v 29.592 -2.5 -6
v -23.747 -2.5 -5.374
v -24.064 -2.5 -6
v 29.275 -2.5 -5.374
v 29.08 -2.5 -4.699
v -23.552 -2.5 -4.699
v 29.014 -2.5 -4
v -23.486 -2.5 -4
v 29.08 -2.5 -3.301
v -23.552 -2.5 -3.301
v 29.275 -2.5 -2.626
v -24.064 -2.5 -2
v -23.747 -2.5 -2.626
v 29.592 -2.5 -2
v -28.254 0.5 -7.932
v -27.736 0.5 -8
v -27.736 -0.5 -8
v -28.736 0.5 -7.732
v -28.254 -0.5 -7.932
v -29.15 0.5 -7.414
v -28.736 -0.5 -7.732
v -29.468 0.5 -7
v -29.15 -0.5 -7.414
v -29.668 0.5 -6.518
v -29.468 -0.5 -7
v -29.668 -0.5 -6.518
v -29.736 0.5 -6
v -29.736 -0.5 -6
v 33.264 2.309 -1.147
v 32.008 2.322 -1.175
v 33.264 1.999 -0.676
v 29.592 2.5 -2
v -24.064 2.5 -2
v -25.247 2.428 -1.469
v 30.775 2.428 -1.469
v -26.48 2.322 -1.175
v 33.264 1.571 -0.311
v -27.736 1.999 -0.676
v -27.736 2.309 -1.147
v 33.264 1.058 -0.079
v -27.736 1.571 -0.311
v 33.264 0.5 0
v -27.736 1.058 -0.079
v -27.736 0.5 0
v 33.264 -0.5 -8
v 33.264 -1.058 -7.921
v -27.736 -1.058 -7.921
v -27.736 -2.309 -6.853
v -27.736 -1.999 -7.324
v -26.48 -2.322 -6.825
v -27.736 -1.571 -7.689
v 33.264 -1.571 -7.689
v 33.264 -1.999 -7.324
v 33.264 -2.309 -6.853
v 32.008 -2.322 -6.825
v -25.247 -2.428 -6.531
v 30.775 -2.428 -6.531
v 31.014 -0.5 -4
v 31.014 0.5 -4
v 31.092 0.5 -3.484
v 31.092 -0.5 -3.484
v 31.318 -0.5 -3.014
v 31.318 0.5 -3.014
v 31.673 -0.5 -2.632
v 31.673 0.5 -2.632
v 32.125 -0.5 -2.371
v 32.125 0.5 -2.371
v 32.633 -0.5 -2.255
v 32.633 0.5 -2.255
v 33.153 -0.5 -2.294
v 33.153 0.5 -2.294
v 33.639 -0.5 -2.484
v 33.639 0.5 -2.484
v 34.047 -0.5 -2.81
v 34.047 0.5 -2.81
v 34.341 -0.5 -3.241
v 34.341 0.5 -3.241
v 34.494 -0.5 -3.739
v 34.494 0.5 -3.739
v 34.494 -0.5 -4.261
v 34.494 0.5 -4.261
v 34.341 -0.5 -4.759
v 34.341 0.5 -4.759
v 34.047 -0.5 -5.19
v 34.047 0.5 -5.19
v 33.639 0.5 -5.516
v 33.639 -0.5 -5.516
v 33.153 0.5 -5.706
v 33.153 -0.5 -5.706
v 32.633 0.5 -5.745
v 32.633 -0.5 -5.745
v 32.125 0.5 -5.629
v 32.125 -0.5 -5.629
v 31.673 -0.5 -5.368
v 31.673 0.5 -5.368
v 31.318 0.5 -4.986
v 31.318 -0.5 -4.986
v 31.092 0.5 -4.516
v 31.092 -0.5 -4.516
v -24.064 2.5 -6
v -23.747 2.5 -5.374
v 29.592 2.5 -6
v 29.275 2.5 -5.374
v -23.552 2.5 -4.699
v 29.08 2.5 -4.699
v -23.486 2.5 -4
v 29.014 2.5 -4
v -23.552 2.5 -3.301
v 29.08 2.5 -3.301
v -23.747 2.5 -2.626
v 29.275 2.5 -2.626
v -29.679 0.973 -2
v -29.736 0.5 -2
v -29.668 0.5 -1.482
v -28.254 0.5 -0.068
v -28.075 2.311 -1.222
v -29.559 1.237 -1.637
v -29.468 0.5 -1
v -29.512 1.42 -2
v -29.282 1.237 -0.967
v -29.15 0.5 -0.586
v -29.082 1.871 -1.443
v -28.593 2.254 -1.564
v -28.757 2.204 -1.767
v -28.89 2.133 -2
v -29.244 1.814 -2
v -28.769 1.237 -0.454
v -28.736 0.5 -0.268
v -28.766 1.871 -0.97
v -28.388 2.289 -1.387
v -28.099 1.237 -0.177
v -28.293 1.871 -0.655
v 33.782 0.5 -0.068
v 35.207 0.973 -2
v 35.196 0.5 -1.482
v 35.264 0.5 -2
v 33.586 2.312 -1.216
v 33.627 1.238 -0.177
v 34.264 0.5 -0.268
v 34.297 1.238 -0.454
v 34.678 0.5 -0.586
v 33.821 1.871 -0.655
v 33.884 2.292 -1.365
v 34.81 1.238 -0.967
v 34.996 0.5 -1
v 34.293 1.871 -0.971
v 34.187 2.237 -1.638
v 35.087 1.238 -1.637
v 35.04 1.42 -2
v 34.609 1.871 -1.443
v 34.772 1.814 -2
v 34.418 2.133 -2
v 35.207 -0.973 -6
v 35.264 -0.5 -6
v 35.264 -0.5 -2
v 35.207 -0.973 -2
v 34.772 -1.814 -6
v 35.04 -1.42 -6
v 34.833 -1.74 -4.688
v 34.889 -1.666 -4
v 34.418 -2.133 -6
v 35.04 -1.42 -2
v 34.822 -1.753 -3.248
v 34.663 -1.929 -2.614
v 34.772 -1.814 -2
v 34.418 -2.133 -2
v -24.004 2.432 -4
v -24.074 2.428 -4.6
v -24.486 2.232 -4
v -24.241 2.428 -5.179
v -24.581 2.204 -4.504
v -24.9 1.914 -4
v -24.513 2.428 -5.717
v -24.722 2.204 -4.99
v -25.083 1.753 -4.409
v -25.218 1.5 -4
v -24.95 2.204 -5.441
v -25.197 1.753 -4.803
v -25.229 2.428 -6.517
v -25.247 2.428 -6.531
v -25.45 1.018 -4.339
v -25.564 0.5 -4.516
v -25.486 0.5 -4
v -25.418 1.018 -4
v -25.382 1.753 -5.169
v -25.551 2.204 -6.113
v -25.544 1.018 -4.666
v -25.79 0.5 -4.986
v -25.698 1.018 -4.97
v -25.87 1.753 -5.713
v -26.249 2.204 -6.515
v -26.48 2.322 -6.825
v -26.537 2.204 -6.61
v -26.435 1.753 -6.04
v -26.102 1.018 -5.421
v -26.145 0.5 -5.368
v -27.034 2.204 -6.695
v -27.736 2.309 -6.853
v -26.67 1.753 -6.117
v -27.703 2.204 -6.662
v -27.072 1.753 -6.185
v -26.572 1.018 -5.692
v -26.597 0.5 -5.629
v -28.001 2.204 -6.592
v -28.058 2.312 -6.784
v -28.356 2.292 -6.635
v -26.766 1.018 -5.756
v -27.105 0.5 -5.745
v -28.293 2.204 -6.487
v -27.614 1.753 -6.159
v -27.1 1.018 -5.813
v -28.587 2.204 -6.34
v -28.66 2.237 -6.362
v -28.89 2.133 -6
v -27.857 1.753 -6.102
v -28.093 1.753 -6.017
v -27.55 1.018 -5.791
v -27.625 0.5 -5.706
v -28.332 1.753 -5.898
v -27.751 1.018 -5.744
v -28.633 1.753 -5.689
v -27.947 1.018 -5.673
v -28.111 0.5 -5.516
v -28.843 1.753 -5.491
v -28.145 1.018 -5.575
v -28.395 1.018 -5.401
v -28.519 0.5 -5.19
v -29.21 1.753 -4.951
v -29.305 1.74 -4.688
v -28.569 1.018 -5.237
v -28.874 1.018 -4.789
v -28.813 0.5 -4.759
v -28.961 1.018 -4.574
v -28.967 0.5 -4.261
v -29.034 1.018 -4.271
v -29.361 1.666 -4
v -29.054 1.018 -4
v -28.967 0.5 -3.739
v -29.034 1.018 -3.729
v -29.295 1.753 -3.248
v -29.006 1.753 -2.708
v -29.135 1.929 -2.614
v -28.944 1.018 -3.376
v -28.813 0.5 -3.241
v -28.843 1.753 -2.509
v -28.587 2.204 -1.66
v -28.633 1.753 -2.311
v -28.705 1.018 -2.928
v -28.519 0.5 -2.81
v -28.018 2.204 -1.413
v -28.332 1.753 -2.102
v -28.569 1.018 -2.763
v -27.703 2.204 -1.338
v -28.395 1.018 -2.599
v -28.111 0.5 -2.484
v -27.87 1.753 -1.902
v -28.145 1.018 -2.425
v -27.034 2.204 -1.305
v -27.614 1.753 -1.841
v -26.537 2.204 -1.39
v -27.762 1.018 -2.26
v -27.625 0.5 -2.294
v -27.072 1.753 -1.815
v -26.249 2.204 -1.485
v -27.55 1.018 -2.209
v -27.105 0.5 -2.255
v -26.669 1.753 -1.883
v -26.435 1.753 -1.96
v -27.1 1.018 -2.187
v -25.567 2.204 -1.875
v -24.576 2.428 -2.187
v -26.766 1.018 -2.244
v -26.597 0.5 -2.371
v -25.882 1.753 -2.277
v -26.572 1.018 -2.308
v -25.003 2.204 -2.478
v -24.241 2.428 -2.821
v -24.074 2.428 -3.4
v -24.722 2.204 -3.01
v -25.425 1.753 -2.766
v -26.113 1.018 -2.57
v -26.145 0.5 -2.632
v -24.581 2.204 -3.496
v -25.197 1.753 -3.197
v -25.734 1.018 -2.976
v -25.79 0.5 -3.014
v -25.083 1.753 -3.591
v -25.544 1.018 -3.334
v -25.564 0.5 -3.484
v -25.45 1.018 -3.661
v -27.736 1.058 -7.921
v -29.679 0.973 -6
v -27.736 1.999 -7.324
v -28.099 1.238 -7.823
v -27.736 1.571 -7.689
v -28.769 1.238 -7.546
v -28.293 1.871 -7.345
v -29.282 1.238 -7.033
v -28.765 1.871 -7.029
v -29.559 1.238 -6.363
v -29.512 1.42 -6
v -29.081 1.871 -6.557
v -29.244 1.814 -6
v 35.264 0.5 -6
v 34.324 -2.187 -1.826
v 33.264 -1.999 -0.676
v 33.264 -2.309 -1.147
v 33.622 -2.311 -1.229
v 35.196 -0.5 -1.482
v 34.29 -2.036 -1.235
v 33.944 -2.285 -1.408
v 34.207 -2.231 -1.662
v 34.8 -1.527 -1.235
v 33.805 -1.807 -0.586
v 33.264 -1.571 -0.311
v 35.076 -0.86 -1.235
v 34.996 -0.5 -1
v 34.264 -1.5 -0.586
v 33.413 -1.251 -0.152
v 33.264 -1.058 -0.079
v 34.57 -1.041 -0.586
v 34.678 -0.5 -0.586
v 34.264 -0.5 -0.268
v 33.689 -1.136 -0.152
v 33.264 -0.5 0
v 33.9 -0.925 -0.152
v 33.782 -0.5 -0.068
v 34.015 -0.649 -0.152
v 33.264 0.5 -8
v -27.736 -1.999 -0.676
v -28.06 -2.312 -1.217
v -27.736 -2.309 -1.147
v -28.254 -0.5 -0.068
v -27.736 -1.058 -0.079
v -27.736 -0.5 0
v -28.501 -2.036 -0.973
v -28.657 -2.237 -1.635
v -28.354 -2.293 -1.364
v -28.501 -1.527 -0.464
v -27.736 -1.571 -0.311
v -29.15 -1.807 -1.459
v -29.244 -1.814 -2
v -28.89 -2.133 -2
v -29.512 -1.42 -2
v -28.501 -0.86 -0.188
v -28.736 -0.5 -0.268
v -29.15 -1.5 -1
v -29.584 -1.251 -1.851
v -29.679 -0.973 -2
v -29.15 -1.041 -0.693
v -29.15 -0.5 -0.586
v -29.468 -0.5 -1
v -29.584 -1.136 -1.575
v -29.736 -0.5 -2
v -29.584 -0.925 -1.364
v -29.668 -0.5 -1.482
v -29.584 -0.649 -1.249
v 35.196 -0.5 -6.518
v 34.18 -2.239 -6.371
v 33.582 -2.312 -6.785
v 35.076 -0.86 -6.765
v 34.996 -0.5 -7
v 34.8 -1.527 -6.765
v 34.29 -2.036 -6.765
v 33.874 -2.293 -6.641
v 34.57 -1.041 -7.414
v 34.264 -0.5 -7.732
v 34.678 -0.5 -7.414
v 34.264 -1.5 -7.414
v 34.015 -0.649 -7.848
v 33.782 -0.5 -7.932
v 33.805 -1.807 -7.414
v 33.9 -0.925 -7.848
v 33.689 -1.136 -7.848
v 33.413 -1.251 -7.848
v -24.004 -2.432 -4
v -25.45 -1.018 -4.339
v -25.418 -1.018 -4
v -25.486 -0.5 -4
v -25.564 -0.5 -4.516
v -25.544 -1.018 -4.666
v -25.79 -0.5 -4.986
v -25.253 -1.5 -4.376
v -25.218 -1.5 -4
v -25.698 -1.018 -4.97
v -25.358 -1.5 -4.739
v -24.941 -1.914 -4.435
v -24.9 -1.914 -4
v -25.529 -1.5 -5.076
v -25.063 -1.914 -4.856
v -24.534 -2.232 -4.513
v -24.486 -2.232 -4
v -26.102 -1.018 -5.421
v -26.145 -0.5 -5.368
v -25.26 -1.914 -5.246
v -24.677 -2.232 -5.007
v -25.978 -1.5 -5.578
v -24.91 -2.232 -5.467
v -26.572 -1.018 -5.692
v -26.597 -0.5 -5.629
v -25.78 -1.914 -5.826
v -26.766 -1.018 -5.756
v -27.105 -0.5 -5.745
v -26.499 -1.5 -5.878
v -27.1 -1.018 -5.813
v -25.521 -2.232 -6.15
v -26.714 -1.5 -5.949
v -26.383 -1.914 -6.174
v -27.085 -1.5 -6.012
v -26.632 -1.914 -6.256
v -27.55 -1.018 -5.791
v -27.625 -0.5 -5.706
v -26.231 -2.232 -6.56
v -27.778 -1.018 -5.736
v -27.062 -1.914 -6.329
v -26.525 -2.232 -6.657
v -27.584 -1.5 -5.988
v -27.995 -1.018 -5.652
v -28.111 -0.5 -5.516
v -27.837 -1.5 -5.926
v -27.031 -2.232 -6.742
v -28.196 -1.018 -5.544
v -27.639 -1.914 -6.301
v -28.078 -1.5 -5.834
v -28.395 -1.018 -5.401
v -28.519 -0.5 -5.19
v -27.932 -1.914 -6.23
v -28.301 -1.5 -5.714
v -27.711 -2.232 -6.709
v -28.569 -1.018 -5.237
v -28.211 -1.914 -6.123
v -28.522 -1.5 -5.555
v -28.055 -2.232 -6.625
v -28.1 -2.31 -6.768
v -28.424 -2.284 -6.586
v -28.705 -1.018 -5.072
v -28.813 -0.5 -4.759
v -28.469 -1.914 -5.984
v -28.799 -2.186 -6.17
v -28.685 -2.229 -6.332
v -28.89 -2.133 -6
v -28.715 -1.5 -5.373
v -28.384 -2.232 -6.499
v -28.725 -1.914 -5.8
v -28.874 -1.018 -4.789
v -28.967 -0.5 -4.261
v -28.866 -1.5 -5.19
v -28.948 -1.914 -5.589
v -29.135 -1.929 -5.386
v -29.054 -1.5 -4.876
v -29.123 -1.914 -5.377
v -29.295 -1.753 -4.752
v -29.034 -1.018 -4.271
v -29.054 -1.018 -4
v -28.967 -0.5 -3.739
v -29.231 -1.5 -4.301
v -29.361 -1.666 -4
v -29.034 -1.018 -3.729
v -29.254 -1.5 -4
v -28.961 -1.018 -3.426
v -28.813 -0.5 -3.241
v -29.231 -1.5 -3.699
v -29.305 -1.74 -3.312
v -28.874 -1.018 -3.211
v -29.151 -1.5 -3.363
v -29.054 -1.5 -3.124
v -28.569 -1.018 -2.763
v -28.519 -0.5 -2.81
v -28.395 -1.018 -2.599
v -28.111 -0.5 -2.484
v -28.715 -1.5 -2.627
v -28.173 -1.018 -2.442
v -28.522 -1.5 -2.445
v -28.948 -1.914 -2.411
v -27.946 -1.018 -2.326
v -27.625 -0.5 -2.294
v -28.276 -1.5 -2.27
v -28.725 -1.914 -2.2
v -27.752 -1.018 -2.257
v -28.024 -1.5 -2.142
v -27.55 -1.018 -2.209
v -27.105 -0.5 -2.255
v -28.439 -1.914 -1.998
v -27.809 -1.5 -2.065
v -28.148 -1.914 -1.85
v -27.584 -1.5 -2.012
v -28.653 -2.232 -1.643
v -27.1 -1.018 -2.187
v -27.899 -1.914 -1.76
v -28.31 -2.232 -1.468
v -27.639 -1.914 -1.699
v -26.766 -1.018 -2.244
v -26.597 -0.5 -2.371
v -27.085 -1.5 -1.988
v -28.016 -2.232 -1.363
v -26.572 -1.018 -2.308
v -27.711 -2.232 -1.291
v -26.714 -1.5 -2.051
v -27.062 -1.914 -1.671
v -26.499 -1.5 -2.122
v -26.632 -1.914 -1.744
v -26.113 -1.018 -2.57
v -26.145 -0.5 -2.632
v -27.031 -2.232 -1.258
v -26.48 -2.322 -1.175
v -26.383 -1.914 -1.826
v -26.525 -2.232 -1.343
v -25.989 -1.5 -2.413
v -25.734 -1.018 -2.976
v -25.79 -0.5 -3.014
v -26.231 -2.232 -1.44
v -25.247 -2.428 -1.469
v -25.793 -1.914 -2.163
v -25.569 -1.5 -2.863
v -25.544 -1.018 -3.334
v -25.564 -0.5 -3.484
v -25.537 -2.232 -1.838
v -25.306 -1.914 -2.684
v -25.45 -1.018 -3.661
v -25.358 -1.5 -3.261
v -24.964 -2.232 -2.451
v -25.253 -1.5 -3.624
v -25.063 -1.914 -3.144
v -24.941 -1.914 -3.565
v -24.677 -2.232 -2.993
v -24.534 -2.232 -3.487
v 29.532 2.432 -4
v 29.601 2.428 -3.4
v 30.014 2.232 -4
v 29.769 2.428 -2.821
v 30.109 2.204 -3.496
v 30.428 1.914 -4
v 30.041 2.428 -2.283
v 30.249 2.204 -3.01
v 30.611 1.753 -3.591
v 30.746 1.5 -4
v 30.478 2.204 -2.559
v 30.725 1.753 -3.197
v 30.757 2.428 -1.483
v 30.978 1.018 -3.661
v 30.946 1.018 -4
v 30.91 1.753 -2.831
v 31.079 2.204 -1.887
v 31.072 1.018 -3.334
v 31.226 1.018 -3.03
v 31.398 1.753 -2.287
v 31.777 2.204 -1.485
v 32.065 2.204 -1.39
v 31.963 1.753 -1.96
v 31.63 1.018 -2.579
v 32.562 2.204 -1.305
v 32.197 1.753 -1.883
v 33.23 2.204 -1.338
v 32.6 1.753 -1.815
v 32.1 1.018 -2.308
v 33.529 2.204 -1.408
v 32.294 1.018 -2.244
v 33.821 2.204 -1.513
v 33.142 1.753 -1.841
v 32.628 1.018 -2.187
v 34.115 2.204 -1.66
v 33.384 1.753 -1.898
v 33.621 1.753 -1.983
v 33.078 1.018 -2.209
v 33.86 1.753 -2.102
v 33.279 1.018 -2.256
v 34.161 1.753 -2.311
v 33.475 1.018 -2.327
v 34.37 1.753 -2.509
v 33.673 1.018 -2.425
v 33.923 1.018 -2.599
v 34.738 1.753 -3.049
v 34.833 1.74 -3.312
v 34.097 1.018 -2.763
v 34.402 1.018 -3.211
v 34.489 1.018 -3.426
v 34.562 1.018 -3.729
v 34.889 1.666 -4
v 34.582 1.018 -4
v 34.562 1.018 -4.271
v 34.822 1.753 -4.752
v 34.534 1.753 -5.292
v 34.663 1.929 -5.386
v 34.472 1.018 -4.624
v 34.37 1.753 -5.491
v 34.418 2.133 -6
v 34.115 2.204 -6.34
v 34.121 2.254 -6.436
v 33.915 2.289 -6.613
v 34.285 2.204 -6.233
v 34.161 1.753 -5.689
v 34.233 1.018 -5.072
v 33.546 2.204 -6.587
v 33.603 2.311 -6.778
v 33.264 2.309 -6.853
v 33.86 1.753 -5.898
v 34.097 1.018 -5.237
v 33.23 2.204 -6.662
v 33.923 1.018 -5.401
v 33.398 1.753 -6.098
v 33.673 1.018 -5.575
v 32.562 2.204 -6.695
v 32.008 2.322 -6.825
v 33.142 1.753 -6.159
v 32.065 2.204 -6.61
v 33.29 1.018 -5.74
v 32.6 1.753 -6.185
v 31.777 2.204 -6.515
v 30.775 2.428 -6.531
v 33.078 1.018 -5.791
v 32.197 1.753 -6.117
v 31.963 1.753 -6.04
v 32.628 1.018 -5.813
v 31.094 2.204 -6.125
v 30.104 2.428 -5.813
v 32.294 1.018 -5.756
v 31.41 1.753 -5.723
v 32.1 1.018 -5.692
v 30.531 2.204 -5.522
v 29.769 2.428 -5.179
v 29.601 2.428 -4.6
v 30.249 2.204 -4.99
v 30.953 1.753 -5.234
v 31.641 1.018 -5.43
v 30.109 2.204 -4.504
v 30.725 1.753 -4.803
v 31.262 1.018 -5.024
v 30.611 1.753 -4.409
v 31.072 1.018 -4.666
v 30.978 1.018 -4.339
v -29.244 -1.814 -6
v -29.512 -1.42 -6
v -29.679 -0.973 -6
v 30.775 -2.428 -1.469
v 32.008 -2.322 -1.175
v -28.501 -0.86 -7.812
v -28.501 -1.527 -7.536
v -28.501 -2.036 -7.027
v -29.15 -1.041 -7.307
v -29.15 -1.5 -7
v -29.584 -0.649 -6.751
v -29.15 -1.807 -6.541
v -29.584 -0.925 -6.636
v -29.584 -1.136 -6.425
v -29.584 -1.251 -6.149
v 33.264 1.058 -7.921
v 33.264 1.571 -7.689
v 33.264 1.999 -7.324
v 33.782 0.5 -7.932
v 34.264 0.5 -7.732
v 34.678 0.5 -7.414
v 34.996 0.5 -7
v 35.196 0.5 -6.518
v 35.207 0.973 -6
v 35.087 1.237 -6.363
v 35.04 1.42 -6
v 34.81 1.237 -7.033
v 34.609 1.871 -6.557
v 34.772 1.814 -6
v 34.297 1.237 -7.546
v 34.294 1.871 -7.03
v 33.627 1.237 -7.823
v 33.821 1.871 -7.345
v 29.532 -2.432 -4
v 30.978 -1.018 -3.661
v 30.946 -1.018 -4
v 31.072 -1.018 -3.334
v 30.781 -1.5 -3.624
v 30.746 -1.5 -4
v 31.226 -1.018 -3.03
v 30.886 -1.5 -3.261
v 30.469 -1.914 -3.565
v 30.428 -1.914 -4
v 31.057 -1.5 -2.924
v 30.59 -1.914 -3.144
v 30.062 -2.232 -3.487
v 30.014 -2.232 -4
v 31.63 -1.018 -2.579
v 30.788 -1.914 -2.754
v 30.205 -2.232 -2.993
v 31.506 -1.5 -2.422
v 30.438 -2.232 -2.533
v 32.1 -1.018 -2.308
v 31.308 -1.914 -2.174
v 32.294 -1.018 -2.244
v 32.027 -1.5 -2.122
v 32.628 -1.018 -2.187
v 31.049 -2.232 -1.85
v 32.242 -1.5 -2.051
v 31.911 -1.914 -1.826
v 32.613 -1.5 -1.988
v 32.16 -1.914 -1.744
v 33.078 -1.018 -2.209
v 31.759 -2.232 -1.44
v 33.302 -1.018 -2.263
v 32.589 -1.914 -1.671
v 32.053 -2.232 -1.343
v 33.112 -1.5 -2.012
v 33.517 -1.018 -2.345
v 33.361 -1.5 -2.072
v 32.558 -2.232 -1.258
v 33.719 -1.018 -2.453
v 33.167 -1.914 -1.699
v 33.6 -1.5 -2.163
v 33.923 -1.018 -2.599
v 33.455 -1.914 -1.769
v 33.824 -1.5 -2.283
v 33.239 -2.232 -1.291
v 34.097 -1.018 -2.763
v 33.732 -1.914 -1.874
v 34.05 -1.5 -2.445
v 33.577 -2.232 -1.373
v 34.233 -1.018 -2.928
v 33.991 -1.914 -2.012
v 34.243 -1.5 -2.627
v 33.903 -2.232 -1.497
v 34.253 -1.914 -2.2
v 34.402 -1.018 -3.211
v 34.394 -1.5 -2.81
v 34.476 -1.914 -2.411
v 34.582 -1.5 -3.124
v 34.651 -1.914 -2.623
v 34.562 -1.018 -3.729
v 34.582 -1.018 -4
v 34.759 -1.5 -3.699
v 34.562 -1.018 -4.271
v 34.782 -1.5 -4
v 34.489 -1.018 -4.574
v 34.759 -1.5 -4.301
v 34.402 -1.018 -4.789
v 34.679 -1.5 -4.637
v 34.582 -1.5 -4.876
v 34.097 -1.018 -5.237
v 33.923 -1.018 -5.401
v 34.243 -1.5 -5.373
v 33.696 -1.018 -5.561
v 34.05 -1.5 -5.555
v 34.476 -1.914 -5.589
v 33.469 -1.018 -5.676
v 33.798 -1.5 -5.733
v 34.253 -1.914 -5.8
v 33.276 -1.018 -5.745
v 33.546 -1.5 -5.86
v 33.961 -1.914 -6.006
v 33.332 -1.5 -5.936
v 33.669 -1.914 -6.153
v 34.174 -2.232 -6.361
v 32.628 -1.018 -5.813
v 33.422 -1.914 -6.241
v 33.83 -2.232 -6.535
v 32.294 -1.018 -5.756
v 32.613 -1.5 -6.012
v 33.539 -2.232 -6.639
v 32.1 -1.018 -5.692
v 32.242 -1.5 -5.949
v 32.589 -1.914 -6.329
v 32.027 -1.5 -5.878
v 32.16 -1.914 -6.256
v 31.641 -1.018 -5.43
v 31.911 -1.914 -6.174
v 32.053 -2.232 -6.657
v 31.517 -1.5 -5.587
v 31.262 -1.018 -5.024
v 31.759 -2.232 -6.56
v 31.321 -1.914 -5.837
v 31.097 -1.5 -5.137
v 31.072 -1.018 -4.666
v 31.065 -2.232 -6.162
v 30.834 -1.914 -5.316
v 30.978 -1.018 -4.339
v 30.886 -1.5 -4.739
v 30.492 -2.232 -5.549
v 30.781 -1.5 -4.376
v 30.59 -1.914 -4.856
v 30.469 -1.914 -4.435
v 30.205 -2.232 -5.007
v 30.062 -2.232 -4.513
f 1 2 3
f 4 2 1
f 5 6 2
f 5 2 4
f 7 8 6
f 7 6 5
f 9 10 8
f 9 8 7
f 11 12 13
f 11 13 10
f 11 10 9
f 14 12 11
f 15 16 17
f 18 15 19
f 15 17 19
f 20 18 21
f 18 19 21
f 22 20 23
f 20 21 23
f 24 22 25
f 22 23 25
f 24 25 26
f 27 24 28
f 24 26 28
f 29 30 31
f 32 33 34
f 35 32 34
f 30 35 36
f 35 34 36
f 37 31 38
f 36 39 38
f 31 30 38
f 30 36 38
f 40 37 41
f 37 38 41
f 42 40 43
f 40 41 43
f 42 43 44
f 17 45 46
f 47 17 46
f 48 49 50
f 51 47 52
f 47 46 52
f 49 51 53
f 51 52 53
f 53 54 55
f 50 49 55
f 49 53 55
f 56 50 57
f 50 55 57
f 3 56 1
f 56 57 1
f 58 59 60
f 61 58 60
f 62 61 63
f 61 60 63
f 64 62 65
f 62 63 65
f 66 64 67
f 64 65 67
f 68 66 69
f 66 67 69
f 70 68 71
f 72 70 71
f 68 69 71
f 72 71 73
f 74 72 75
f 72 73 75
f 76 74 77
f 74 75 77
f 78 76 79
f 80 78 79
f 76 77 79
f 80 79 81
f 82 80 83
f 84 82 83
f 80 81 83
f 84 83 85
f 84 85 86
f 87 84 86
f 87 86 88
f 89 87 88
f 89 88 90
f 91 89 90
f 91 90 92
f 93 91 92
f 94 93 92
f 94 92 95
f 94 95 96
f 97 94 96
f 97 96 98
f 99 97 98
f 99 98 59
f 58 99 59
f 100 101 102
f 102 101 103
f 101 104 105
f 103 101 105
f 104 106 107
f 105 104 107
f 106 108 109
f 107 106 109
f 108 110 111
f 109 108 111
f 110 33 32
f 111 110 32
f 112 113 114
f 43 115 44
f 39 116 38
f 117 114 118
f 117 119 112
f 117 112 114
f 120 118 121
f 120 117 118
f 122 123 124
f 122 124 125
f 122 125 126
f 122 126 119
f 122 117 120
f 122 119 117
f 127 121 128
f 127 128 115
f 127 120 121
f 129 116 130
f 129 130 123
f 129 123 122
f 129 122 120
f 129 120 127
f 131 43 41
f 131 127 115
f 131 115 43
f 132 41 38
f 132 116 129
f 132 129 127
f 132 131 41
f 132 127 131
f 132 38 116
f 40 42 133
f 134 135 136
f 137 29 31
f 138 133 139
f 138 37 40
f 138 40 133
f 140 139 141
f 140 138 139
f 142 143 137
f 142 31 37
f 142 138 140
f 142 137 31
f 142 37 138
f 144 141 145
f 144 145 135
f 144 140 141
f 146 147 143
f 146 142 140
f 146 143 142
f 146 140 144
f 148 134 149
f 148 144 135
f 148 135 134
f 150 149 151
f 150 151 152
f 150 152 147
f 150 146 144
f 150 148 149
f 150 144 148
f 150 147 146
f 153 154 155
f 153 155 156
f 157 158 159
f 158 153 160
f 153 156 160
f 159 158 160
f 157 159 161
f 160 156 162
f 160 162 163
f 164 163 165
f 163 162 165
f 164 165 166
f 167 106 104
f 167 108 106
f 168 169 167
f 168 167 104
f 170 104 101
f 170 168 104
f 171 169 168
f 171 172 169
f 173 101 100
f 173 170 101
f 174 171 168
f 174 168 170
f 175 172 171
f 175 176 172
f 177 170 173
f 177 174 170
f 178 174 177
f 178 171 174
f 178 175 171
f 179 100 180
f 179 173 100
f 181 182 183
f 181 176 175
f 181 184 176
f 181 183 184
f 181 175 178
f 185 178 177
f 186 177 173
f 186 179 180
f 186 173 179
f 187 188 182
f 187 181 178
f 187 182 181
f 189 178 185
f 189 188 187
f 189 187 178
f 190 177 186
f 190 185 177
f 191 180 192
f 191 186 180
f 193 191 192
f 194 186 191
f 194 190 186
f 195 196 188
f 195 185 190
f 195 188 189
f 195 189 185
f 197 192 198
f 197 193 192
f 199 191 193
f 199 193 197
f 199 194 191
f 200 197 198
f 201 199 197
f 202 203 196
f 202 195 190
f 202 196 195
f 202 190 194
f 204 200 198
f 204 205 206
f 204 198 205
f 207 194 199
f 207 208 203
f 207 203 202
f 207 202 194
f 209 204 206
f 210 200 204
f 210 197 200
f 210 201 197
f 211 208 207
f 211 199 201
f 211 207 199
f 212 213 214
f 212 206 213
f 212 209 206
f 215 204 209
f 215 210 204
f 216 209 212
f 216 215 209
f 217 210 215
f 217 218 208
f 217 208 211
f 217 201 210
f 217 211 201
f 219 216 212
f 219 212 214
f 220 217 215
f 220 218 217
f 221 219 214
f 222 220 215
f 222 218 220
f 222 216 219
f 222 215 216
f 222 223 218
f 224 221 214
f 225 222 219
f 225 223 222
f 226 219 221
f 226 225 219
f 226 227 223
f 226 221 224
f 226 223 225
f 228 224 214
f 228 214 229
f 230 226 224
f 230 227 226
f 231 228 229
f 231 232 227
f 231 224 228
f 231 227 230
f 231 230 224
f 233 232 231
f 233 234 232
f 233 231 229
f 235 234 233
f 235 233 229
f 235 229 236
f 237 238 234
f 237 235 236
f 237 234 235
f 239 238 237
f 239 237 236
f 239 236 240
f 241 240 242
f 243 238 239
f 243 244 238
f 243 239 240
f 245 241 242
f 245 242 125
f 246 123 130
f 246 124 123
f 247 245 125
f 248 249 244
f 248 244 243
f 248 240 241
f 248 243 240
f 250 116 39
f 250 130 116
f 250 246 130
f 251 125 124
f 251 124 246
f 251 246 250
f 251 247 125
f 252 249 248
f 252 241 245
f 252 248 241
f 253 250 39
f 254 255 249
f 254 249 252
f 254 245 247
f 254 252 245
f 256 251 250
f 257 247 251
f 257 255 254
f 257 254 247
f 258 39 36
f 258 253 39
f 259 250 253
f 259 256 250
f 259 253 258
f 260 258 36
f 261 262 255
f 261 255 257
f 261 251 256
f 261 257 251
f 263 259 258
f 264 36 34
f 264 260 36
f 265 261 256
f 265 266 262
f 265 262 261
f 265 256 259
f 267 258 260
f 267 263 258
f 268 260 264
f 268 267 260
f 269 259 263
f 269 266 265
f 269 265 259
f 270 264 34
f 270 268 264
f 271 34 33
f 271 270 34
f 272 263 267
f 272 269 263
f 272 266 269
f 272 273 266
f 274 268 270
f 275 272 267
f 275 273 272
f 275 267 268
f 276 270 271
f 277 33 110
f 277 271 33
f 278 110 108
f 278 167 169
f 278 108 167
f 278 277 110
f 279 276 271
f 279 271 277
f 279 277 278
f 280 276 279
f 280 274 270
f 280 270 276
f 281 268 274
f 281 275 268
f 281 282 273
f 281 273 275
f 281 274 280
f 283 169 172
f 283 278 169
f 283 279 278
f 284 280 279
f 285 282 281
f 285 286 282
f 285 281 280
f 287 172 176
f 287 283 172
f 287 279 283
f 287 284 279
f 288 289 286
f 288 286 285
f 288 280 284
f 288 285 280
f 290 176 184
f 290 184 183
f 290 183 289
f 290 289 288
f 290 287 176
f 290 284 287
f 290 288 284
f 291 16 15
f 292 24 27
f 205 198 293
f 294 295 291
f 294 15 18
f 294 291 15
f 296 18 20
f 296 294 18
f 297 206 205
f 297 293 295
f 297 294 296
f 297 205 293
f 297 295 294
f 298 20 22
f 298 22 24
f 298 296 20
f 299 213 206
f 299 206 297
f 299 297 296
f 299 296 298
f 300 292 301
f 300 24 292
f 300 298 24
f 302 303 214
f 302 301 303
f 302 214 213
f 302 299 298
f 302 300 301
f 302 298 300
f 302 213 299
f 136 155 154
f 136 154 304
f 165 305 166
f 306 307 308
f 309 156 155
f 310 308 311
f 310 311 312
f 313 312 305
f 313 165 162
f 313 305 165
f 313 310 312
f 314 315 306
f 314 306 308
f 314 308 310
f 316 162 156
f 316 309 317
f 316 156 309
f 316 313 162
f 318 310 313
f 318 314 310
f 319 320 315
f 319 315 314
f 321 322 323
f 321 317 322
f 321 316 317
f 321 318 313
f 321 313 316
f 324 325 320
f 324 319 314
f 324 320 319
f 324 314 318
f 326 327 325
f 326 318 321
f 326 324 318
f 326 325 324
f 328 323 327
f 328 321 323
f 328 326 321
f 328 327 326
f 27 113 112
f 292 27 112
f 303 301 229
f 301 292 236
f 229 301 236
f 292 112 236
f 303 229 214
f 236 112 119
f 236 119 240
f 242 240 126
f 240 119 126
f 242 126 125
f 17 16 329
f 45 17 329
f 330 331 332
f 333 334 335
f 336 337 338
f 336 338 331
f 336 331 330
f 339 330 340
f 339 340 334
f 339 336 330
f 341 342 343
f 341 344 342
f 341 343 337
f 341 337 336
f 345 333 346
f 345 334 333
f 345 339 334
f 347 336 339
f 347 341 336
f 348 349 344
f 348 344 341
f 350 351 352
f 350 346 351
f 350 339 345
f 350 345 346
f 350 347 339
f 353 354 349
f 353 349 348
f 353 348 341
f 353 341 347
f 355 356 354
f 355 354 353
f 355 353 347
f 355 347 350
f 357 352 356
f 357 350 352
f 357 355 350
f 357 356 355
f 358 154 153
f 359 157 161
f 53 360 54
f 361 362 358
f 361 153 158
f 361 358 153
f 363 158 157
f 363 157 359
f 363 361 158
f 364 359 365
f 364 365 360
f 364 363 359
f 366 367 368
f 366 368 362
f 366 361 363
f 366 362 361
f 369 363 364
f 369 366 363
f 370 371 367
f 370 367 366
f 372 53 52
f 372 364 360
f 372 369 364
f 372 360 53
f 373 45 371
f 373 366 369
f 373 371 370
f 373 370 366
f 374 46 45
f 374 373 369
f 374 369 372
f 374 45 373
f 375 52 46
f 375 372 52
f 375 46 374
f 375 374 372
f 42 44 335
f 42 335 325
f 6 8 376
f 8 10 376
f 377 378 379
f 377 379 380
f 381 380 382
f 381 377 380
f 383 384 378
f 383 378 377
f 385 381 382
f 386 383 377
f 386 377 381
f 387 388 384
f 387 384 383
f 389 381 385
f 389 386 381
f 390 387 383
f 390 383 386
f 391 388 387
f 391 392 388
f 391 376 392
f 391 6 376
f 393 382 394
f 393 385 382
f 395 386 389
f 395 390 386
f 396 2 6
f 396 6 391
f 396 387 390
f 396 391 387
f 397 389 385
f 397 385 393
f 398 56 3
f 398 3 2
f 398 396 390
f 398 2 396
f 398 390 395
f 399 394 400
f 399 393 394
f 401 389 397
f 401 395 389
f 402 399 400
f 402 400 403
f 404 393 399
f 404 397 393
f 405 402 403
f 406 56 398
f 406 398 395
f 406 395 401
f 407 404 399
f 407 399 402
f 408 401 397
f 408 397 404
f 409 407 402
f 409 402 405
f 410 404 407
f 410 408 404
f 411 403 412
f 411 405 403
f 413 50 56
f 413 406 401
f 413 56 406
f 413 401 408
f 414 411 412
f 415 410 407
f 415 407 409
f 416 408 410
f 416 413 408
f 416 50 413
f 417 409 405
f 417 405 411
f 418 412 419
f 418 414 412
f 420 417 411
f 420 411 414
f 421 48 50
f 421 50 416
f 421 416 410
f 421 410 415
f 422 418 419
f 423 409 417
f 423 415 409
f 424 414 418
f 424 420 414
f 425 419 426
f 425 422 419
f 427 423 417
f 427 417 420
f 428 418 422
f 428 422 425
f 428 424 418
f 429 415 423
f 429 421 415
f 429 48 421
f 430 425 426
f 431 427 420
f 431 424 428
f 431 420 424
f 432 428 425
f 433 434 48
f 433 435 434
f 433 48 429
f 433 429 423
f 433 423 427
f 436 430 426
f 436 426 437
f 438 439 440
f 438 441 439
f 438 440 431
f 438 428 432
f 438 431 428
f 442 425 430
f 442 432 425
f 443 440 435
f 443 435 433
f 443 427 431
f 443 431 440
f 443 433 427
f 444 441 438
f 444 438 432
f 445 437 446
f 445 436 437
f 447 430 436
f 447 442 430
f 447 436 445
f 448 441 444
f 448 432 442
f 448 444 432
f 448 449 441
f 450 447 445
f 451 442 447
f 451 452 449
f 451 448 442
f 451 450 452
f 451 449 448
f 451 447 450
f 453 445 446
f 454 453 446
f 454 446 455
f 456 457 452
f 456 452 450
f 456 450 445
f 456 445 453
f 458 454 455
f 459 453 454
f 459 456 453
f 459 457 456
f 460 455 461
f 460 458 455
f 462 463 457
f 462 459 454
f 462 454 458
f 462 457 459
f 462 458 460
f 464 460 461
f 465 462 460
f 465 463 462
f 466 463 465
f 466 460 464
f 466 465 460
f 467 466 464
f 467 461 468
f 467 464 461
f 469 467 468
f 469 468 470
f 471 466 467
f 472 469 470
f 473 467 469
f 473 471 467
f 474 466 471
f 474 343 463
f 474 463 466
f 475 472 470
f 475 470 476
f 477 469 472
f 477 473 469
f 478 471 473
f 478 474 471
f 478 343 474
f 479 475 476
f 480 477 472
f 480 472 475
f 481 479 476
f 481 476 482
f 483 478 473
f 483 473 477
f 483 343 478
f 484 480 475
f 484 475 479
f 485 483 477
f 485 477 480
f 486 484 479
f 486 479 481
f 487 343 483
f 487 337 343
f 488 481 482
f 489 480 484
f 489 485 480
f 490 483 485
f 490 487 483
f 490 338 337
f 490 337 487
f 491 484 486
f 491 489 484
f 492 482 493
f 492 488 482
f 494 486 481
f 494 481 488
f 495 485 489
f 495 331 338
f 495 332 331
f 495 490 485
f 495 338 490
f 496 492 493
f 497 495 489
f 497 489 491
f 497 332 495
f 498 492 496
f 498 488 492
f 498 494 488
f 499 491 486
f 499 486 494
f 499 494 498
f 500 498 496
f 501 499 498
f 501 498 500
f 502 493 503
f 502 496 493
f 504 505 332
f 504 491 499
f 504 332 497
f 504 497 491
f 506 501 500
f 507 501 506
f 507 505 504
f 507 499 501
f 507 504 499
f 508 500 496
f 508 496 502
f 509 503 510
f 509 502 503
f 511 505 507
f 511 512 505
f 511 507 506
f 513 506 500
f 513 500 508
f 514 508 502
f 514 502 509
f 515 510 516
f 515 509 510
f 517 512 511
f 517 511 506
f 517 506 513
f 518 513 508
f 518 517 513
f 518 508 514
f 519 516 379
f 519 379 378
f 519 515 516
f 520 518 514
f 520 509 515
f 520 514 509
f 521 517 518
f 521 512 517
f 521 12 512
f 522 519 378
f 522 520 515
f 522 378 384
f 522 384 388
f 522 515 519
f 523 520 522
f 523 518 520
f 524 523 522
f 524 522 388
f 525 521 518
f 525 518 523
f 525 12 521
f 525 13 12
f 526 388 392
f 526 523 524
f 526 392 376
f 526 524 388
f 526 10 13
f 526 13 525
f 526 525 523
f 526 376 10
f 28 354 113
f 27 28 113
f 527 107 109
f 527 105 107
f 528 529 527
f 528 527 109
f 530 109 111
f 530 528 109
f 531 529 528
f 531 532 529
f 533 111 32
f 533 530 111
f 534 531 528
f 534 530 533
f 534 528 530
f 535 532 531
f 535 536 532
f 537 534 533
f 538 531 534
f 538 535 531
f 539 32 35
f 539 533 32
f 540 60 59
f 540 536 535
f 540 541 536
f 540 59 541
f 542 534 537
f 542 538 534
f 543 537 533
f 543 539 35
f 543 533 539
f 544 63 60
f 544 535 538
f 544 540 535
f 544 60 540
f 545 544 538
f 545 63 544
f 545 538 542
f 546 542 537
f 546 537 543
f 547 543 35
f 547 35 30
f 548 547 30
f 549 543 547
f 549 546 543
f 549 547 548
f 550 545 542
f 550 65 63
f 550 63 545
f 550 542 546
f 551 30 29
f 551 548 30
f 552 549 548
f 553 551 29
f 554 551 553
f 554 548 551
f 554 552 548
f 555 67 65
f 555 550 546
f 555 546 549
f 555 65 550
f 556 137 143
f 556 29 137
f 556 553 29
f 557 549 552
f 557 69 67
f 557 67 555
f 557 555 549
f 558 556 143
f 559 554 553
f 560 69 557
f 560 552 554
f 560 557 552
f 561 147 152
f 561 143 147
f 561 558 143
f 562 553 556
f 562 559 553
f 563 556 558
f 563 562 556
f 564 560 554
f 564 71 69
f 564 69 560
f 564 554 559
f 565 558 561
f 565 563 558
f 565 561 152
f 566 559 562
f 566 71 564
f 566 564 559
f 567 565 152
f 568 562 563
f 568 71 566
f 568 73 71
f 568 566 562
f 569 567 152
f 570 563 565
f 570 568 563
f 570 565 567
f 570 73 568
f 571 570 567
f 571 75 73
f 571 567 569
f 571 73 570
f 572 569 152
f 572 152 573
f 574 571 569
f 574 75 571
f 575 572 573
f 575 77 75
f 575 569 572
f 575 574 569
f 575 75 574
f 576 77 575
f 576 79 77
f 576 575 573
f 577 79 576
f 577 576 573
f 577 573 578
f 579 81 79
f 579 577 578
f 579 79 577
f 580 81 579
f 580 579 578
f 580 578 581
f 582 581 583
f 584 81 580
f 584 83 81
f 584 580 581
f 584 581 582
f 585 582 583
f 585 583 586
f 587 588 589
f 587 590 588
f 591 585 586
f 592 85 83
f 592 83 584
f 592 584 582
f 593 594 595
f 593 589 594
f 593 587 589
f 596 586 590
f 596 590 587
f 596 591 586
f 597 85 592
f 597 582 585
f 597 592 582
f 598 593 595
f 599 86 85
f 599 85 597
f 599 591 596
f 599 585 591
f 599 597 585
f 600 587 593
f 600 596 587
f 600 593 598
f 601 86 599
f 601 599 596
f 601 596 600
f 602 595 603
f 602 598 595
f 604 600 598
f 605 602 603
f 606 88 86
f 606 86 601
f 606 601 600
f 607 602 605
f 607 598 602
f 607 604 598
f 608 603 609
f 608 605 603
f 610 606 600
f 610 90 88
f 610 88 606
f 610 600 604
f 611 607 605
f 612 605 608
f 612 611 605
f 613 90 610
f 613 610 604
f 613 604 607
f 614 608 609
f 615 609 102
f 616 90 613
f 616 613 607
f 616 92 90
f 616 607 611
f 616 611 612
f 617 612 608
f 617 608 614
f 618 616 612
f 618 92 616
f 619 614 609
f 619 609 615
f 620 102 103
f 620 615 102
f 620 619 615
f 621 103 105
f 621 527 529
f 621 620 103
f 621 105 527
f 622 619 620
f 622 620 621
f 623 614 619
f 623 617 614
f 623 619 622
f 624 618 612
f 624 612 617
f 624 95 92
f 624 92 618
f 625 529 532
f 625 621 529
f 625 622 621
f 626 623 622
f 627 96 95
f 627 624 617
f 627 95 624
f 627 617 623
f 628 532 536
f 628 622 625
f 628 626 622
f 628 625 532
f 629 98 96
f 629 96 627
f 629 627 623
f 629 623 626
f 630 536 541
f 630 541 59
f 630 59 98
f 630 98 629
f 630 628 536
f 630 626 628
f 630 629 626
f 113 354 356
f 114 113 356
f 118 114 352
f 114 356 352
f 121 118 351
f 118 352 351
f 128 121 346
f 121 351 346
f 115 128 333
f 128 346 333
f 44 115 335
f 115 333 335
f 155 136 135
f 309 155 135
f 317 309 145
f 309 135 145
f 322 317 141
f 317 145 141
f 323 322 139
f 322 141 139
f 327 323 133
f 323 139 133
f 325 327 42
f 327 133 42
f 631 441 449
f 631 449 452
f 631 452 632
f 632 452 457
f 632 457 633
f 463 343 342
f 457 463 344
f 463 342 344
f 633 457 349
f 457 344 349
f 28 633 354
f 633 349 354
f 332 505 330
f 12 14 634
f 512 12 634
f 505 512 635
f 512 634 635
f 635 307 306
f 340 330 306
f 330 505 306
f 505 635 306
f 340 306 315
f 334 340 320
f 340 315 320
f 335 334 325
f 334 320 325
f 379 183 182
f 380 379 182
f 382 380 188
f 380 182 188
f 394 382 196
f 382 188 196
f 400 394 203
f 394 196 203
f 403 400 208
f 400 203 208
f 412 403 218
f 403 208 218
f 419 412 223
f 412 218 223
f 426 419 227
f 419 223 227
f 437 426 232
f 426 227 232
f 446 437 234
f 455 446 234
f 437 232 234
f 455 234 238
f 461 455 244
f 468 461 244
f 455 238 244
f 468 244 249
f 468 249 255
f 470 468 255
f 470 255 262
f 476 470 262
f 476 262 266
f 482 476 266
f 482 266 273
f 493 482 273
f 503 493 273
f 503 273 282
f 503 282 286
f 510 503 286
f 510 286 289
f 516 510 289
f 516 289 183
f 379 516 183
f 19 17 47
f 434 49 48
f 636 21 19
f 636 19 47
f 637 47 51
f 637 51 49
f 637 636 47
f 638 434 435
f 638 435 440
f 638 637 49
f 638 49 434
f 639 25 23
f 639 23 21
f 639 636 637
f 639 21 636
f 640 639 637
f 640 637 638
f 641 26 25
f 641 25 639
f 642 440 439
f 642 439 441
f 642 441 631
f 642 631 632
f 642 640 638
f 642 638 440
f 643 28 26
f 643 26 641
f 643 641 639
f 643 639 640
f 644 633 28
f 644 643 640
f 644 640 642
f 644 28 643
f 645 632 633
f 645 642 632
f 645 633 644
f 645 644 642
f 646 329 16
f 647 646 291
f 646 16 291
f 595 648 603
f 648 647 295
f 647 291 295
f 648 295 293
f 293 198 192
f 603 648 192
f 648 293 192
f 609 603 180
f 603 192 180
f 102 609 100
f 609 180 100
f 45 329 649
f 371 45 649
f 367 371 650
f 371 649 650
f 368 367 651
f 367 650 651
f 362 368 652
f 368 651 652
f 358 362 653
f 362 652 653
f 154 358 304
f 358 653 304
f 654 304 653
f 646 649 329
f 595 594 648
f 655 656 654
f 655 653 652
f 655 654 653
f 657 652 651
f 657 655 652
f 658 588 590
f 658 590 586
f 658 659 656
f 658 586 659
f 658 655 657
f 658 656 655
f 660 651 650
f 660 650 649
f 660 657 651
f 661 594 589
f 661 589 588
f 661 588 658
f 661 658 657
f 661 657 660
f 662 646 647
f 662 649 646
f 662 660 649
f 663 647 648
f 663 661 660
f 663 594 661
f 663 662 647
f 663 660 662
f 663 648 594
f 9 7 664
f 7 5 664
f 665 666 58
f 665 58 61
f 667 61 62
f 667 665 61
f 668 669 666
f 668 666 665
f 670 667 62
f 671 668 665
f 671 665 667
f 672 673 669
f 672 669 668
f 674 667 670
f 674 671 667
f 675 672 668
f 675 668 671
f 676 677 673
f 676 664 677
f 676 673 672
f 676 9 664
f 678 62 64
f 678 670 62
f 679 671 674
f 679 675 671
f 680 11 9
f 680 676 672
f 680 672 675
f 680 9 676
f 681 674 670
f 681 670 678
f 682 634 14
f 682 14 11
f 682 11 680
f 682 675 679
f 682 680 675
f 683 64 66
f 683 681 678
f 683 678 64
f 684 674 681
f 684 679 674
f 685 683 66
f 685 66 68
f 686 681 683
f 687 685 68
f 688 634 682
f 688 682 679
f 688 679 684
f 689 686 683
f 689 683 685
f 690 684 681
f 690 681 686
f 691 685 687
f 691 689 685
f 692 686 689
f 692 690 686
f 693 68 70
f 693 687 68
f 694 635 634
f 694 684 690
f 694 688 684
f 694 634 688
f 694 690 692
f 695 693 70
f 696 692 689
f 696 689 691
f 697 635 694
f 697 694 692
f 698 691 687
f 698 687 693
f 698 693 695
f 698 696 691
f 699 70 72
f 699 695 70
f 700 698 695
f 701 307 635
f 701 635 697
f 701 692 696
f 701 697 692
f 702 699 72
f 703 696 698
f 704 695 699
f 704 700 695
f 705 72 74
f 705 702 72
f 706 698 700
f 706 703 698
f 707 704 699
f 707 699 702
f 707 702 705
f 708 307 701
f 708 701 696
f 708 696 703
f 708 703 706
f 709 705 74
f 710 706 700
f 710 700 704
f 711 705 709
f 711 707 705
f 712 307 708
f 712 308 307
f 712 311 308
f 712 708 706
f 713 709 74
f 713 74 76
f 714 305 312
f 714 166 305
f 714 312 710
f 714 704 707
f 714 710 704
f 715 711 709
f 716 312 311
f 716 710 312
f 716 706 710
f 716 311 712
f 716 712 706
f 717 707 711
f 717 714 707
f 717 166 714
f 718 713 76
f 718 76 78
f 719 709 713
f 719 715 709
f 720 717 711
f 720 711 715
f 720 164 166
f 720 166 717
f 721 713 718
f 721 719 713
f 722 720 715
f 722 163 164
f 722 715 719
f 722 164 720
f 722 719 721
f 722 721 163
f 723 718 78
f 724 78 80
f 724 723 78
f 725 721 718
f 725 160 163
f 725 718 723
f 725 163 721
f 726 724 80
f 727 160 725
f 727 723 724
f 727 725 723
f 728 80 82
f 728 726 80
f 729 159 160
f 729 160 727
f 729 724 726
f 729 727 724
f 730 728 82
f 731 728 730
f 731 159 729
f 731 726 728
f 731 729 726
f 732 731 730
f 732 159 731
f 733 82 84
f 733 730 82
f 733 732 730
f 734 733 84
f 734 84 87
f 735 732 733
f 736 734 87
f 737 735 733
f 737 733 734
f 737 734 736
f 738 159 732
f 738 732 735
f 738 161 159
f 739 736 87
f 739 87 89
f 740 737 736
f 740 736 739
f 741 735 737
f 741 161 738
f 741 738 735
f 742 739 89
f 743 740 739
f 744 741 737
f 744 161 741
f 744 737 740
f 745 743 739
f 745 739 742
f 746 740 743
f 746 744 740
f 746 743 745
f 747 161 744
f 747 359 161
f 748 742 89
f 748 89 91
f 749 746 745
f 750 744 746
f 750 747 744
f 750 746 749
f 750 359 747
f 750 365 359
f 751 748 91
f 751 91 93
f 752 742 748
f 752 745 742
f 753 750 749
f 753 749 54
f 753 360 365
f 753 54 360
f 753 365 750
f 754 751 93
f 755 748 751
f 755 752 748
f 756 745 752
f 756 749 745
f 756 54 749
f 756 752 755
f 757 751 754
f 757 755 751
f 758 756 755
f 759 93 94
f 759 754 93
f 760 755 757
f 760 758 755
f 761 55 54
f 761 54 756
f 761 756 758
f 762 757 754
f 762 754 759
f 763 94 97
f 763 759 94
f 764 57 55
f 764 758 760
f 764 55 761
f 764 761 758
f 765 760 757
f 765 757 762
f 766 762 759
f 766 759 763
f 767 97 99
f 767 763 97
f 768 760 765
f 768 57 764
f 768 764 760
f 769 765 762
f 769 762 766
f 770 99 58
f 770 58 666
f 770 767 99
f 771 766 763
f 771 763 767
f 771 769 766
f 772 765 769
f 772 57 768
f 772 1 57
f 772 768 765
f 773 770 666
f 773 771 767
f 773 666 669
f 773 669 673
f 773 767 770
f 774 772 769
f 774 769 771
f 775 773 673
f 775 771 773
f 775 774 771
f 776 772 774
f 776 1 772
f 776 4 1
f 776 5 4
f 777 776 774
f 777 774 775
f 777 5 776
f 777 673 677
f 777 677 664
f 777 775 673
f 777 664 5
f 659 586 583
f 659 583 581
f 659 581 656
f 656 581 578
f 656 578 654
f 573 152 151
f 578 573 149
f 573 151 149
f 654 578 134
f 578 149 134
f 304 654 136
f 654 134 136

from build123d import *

# Parameters (mm, degrees)
SKETCH1_W           = 65
SKETCH1_H           = 5
BOSS_EXTRUDE1_DEPTH = 8
SKETCH2_R           = 1.75
CUT_EXTRUDE1_DEPTH  = 37.504037204
FILLET1_R           = 2


with BuildPart() as part:
    # Sketch1 → Boss-Extrude1 (new body)
    with BuildSketch(Plane.XY):
        with Locations((2.763929619, 0)):
            Rectangle(SKETCH1_W, SKETCH1_H)
    extrude(amount=-BOSS_EXTRUDE1_DEPTH)

    # Sketch2 → Cut-Extrude1 (cut, through all)
    with BuildSketch(Plane(origin=(0, 2.5, 0), x_dir=(1, 0, 0), z_dir=(0, 1, 0))):
        with Locations(Location((32.763929619, 4, 0), (0, 0, 180))):
            Circle(SKETCH2_R)
        with Locations((-27.236070381, 4)):
            Circle(SKETCH2_R)
    extrude(amount=-CUT_EXTRUDE1_DEPTH, mode=Mode.SUBTRACT)

    # Fillet1
    # the kernel refuses this fillet: 2 mm, written as the material it takes off along each edge
    with BuildSketch(Plane(origin=(33.263929619, 0.5, -6), x_dir=(0, 0, -1), z_dir=(0, 1, 0))) as fillet1_piece_1_section:
        Polygon((0, 0), (FILLET1_R, 0), (FILLET1_R, -FILLET1_R), (0, -FILLET1_R), align=None)
    fillet1_piece_1 = extrude(amount=FILLET1_R, mode=Mode.PRIVATE)
    fillet1_piece_1 = fillet1_piece_1 - Plane(origin=(33.263929619, 0.5, -6), x_dir=(-0.7071067811865475, 0, 0.7071067811865475), z_dir=(0, 1, 0)) * Sphere(FILLET1_R, mode=Mode.PRIVATE)
    add(fillet1_piece_1, mode=Mode.SUBTRACT)
    with BuildSketch(Plane(origin=(33.263929619, -0.5, -6), x_dir=(1, 0, 0), z_dir=(0, 0, -1))) as fillet1_piece_2_section:
        Polygon((0, 0), (FILLET1_R, 0), (FILLET1_R, FILLET1_R), (0, FILLET1_R), align=None)
    fillet1_piece_2 = extrude(amount=FILLET1_R, mode=Mode.PRIVATE)
    fillet1_piece_2 = fillet1_piece_2 - Plane(origin=(33.263929619, -0.5, -6), x_dir=(-0.7071067811865475, 0.7071067811865475, 0), z_dir=(0, 0, -1)) * Sphere(FILLET1_R, mode=Mode.PRIVATE)
    add(fillet1_piece_2, mode=Mode.SUBTRACT)
    with BuildSketch(Plane(origin=(-27.736070381, 0.5, -6), x_dir=(-1, 0, 0), z_dir=(0, 1, 0))) as fillet1_piece_3_section:
        Polygon((0, 0), (FILLET1_R, 0), (FILLET1_R, -FILLET1_R), (0, -FILLET1_R), align=None)
    fillet1_piece_3 = extrude(amount=FILLET1_R, mode=Mode.PRIVATE)
    fillet1_piece_3 = fillet1_piece_3 - Plane(origin=(-27.736070381, 0.5, -6), x_dir=(0.7071067811865475, 0, 0.7071067811865475), z_dir=(0, 1, 0)) * Sphere(FILLET1_R, mode=Mode.PRIVATE)
    add(fillet1_piece_3, mode=Mode.SUBTRACT)
    with BuildSketch(Plane(origin=(-27.736070381, -0.5, -6), x_dir=(0, 0, -1), z_dir=(-1, 0, 0))) as fillet1_piece_4_section:
        Polygon((0, 0), (FILLET1_R, 0), (FILLET1_R, FILLET1_R), (0, FILLET1_R), align=None)
    fillet1_piece_4 = extrude(amount=FILLET1_R, mode=Mode.PRIVATE)
    fillet1_piece_4 = fillet1_piece_4 - Plane(origin=(-27.736070381, -0.5, -6), x_dir=(0, 0.7071067811865475, 0.7071067811865475), z_dir=(-1, 0, 0)) * Sphere(FILLET1_R, mode=Mode.PRIVATE)
    add(fillet1_piece_4, mode=Mode.SUBTRACT)
    with BuildSketch(Plane(origin=(-27.736070381, 0.5, -2), x_dir=(-1, 0, 0), z_dir=(0, 1, 0))) as fillet1_piece_5_section:
        Polygon((0, 0), (FILLET1_R, 0), (FILLET1_R, FILLET1_R), (0, FILLET1_R), align=None)
    fillet1_piece_5 = extrude(amount=FILLET1_R, mode=Mode.PRIVATE)
    fillet1_piece_5 = fillet1_piece_5 - Plane(origin=(-27.736070381, 0.5, -2), x_dir=(0.7071067811865475, 0, -0.7071067811865475), z_dir=(0, 1, 0)) * Sphere(FILLET1_R, mode=Mode.PRIVATE)
    add(fillet1_piece_5, mode=Mode.SUBTRACT)
    with BuildSketch(Plane(origin=(33.263929619, 0.5, -2), x_dir=(0, 0, 1), z_dir=(0, 1, 0))) as fillet1_piece_6_section:
        Polygon((0, 0), (FILLET1_R, 0), (FILLET1_R, FILLET1_R), (0, FILLET1_R), align=None)
    fillet1_piece_6 = extrude(amount=FILLET1_R, mode=Mode.PRIVATE)
    fillet1_piece_6 = fillet1_piece_6 - Plane(origin=(33.263929619, 0.5, -2), x_dir=(-0.7071067811865475, 0, -0.7071067811865475), z_dir=(0, 1, 0)) * Sphere(FILLET1_R, mode=Mode.PRIVATE)
    add(fillet1_piece_6, mode=Mode.SUBTRACT)
    with BuildSketch(Plane(origin=(33.263929619, -0.5, -2), x_dir=(1, 0, 0), z_dir=(0, 0, 1))) as fillet1_piece_7_section:
        Polygon((0, 0), (FILLET1_R, 0), (FILLET1_R, -FILLET1_R), (0, -FILLET1_R), align=None)
    fillet1_piece_7 = extrude(amount=FILLET1_R, mode=Mode.PRIVATE)
    fillet1_piece_7 = fillet1_piece_7 - Plane(origin=(33.263929619, -0.5, -2), x_dir=(-0.7071067811865475, 0.7071067811865475, 0), z_dir=(0, 0, 1)) * Sphere(FILLET1_R, mode=Mode.PRIVATE)
    add(fillet1_piece_7, mode=Mode.SUBTRACT)
    with BuildSketch(Plane(origin=(-27.736070381, -0.5, -2), x_dir=(0, 0, 1), z_dir=(-1, 0, 0))) as fillet1_piece_8_section:
        Polygon((0, 0), (FILLET1_R, 0), (FILLET1_R, -FILLET1_R), (0, -FILLET1_R), align=None)
    fillet1_piece_8 = extrude(amount=FILLET1_R, mode=Mode.PRIVATE)
    fillet1_piece_8 = fillet1_piece_8 - Plane(origin=(-27.736070381, -0.5, -2), x_dir=(0, 0.7071067811865475, -0.7071067811865475), z_dir=(-1, 0, 0)) * Sphere(FILLET1_R, mode=Mode.PRIVATE)
    add(fillet1_piece_8, mode=Mode.SUBTRACT)
    with BuildSketch(Plane(origin=(35.263929619, 0.5, -8), x_dir=(-1, 0, 0), z_dir=(0, -1, 0)), Plane(origin=(-29.736070381, -0.5, 0), x_dir=(0, 0, -1), z_dir=(0, 1, 0))) as fillet1_piece_9:
        with BuildLine():
            CenterArc((FILLET1_R, -FILLET1_R), FILLET1_R, 90, 90)
            Line((0, -FILLET1_R), (0, 0))
            Line((0, 0), (FILLET1_R, 0))
        make_face()
    extrude(amount=1, mode=Mode.SUBTRACT)
    with BuildSketch(Plane(origin=(-27.736070381, 2.5, -8), x_dir=(0, 0, 1), z_dir=(1, 0, 0)), Plane(origin=(33.263929619, -2.5, 0), x_dir=(0, 1, 0), z_dir=(-1, 0, 0))) as fillet1_piece_10:
        with BuildLine():
            CenterArc((FILLET1_R, FILLET1_R), FILLET1_R, 180, 90)
            Line((0, FILLET1_R), (0, 0))
            Line((0, 0), (FILLET1_R, 0))
        make_face()
    extrude(amount=61, mode=Mode.SUBTRACT)
    with BuildSketch(Plane(origin=(-27.236070381, 2.5, -4), x_dir=(1, 0, 0), z_dir=(0, 0, 1))) as fillet1_piece_11:
        with BuildLine():
            CenterArc((1.75 + FILLET1_R, -FILLET1_R), FILLET1_R, 90, 90)
            Line((1.75, -FILLET1_R), (1.75, 0))
            Line((1.75, 0), (1.75 + FILLET1_R, 0))
        make_face()
    revolve(axis=Axis((-27.236070381, 2.5, -4), (0, 1, 0)), mode=Mode.SUBTRACT)
    with BuildSketch(Plane(origin=(-27.236070381, -2.5, -4), x_dir=(1, 0, 0), z_dir=(0, 0, 1))) as fillet1_piece_12:
        with BuildLine():
            CenterArc((1.75 + FILLET1_R, FILLET1_R), FILLET1_R, 180, 90)
            Line((1.75 + FILLET1_R, 0), (1.75, 0))
            Line((1.75, 0), (1.75, FILLET1_R))
        make_face()
    revolve(axis=Axis((-27.236070381, -2.5, -4), (0, 1, 0)), mode=Mode.SUBTRACT)
    with BuildSketch(Plane(origin=(32.763929619, -2.5, -4), x_dir=(-1, 0, 0), z_dir=(0, 0, -1))) as fillet1_piece_13:
        with BuildLine():
            CenterArc((1.75 + FILLET1_R, FILLET1_R), FILLET1_R, 180, 90)
            Line((1.75 + FILLET1_R, 0), (1.75, 0))
            Line((1.75, 0), (1.75, FILLET1_R))
        make_face()
    revolve(axis=Axis((32.763929619, -2.5, -4), (0, 1, 0)), mode=Mode.SUBTRACT)
    with BuildSketch(Plane(origin=(32.763929619, 2.5, -4), x_dir=(-1, 0, 0), z_dir=(0, 0, -1))) as fillet1_piece_14:
        with BuildLine():
            CenterArc((1.75 + FILLET1_R, -FILLET1_R), FILLET1_R, 90, 90)
            Line((1.75, -FILLET1_R), (1.75, 0))
            Line((1.75, 0), (1.75 + FILLET1_R, 0))
        make_face()
    revolve(axis=Axis((32.763929619, 2.5, -4), (0, 1, 0)), mode=Mode.SUBTRACT)
    with BuildSketch(Plane(origin=(-29.736070381, -0.5, -8), x_dir=(0, 0, 1), z_dir=(0, 1, 0)), Plane(origin=(35.263929619, 0.5, 0), x_dir=(-1, 0, 0), z_dir=(0, -1, 0))) as fillet1_piece_15:
        with BuildLine():
            CenterArc((FILLET1_R, FILLET1_R), FILLET1_R, 180, 90)
            Line((0, FILLET1_R), (0, 0))
            Line((0, 0), (FILLET1_R, 0))
        make_face()
    extrude(amount=1, mode=Mode.SUBTRACT)
    with BuildSketch(Plane(origin=(-27.736070381, 2.5, 0), x_dir=(0, 0, -1), z_dir=(1, 0, 0)), Plane(origin=(33.263929619, -2.5, -8), x_dir=(0, 1, 0), z_dir=(-1, 0, 0))) as fillet1_piece_16:
        with BuildLine():
            CenterArc((FILLET1_R, -FILLET1_R), FILLET1_R, 90, 90)
            Line((0, -FILLET1_R), (0, 0))
            Line((0, 0), (FILLET1_R, 0))
        make_face()
    extrude(amount=61, mode=Mode.SUBTRACT)
    with BuildSketch(Plane(origin=(-29.736070381, 2.5, -2), x_dir=(1, 0, 0), z_dir=(0, 0, -1)), Plane(origin=(-29.736070381, -2.5, -2), x_dir=(0, 1, 0), z_dir=(0, 0, -1))) as fillet1_piece_17:
        with BuildLine():
            CenterArc((FILLET1_R, FILLET1_R), FILLET1_R, 180, 90)
            Line((0, FILLET1_R), (0, 0))
            Line((0, 0), (FILLET1_R, 0))
        make_face()
    extrude(amount=4, mode=Mode.SUBTRACT)
    with BuildSketch(Plane(origin=(35.263929619, 2.5, -2), x_dir=(-1, 0, 0), z_dir=(0, 0, -1)), Plane(origin=(35.263929619, -2.5, -2), x_dir=(0, 1, 0), z_dir=(0, 0, -1))) as fillet1_piece_18:
        with BuildLine():
            CenterArc((FILLET1_R, -FILLET1_R), FILLET1_R, 90, 90)
            Line((0, -FILLET1_R), (0, 0))
            Line((0, 0), (FILLET1_R, 0))
        make_face()
    extrude(amount=4, mode=Mode.SUBTRACT)


solid = part.part
